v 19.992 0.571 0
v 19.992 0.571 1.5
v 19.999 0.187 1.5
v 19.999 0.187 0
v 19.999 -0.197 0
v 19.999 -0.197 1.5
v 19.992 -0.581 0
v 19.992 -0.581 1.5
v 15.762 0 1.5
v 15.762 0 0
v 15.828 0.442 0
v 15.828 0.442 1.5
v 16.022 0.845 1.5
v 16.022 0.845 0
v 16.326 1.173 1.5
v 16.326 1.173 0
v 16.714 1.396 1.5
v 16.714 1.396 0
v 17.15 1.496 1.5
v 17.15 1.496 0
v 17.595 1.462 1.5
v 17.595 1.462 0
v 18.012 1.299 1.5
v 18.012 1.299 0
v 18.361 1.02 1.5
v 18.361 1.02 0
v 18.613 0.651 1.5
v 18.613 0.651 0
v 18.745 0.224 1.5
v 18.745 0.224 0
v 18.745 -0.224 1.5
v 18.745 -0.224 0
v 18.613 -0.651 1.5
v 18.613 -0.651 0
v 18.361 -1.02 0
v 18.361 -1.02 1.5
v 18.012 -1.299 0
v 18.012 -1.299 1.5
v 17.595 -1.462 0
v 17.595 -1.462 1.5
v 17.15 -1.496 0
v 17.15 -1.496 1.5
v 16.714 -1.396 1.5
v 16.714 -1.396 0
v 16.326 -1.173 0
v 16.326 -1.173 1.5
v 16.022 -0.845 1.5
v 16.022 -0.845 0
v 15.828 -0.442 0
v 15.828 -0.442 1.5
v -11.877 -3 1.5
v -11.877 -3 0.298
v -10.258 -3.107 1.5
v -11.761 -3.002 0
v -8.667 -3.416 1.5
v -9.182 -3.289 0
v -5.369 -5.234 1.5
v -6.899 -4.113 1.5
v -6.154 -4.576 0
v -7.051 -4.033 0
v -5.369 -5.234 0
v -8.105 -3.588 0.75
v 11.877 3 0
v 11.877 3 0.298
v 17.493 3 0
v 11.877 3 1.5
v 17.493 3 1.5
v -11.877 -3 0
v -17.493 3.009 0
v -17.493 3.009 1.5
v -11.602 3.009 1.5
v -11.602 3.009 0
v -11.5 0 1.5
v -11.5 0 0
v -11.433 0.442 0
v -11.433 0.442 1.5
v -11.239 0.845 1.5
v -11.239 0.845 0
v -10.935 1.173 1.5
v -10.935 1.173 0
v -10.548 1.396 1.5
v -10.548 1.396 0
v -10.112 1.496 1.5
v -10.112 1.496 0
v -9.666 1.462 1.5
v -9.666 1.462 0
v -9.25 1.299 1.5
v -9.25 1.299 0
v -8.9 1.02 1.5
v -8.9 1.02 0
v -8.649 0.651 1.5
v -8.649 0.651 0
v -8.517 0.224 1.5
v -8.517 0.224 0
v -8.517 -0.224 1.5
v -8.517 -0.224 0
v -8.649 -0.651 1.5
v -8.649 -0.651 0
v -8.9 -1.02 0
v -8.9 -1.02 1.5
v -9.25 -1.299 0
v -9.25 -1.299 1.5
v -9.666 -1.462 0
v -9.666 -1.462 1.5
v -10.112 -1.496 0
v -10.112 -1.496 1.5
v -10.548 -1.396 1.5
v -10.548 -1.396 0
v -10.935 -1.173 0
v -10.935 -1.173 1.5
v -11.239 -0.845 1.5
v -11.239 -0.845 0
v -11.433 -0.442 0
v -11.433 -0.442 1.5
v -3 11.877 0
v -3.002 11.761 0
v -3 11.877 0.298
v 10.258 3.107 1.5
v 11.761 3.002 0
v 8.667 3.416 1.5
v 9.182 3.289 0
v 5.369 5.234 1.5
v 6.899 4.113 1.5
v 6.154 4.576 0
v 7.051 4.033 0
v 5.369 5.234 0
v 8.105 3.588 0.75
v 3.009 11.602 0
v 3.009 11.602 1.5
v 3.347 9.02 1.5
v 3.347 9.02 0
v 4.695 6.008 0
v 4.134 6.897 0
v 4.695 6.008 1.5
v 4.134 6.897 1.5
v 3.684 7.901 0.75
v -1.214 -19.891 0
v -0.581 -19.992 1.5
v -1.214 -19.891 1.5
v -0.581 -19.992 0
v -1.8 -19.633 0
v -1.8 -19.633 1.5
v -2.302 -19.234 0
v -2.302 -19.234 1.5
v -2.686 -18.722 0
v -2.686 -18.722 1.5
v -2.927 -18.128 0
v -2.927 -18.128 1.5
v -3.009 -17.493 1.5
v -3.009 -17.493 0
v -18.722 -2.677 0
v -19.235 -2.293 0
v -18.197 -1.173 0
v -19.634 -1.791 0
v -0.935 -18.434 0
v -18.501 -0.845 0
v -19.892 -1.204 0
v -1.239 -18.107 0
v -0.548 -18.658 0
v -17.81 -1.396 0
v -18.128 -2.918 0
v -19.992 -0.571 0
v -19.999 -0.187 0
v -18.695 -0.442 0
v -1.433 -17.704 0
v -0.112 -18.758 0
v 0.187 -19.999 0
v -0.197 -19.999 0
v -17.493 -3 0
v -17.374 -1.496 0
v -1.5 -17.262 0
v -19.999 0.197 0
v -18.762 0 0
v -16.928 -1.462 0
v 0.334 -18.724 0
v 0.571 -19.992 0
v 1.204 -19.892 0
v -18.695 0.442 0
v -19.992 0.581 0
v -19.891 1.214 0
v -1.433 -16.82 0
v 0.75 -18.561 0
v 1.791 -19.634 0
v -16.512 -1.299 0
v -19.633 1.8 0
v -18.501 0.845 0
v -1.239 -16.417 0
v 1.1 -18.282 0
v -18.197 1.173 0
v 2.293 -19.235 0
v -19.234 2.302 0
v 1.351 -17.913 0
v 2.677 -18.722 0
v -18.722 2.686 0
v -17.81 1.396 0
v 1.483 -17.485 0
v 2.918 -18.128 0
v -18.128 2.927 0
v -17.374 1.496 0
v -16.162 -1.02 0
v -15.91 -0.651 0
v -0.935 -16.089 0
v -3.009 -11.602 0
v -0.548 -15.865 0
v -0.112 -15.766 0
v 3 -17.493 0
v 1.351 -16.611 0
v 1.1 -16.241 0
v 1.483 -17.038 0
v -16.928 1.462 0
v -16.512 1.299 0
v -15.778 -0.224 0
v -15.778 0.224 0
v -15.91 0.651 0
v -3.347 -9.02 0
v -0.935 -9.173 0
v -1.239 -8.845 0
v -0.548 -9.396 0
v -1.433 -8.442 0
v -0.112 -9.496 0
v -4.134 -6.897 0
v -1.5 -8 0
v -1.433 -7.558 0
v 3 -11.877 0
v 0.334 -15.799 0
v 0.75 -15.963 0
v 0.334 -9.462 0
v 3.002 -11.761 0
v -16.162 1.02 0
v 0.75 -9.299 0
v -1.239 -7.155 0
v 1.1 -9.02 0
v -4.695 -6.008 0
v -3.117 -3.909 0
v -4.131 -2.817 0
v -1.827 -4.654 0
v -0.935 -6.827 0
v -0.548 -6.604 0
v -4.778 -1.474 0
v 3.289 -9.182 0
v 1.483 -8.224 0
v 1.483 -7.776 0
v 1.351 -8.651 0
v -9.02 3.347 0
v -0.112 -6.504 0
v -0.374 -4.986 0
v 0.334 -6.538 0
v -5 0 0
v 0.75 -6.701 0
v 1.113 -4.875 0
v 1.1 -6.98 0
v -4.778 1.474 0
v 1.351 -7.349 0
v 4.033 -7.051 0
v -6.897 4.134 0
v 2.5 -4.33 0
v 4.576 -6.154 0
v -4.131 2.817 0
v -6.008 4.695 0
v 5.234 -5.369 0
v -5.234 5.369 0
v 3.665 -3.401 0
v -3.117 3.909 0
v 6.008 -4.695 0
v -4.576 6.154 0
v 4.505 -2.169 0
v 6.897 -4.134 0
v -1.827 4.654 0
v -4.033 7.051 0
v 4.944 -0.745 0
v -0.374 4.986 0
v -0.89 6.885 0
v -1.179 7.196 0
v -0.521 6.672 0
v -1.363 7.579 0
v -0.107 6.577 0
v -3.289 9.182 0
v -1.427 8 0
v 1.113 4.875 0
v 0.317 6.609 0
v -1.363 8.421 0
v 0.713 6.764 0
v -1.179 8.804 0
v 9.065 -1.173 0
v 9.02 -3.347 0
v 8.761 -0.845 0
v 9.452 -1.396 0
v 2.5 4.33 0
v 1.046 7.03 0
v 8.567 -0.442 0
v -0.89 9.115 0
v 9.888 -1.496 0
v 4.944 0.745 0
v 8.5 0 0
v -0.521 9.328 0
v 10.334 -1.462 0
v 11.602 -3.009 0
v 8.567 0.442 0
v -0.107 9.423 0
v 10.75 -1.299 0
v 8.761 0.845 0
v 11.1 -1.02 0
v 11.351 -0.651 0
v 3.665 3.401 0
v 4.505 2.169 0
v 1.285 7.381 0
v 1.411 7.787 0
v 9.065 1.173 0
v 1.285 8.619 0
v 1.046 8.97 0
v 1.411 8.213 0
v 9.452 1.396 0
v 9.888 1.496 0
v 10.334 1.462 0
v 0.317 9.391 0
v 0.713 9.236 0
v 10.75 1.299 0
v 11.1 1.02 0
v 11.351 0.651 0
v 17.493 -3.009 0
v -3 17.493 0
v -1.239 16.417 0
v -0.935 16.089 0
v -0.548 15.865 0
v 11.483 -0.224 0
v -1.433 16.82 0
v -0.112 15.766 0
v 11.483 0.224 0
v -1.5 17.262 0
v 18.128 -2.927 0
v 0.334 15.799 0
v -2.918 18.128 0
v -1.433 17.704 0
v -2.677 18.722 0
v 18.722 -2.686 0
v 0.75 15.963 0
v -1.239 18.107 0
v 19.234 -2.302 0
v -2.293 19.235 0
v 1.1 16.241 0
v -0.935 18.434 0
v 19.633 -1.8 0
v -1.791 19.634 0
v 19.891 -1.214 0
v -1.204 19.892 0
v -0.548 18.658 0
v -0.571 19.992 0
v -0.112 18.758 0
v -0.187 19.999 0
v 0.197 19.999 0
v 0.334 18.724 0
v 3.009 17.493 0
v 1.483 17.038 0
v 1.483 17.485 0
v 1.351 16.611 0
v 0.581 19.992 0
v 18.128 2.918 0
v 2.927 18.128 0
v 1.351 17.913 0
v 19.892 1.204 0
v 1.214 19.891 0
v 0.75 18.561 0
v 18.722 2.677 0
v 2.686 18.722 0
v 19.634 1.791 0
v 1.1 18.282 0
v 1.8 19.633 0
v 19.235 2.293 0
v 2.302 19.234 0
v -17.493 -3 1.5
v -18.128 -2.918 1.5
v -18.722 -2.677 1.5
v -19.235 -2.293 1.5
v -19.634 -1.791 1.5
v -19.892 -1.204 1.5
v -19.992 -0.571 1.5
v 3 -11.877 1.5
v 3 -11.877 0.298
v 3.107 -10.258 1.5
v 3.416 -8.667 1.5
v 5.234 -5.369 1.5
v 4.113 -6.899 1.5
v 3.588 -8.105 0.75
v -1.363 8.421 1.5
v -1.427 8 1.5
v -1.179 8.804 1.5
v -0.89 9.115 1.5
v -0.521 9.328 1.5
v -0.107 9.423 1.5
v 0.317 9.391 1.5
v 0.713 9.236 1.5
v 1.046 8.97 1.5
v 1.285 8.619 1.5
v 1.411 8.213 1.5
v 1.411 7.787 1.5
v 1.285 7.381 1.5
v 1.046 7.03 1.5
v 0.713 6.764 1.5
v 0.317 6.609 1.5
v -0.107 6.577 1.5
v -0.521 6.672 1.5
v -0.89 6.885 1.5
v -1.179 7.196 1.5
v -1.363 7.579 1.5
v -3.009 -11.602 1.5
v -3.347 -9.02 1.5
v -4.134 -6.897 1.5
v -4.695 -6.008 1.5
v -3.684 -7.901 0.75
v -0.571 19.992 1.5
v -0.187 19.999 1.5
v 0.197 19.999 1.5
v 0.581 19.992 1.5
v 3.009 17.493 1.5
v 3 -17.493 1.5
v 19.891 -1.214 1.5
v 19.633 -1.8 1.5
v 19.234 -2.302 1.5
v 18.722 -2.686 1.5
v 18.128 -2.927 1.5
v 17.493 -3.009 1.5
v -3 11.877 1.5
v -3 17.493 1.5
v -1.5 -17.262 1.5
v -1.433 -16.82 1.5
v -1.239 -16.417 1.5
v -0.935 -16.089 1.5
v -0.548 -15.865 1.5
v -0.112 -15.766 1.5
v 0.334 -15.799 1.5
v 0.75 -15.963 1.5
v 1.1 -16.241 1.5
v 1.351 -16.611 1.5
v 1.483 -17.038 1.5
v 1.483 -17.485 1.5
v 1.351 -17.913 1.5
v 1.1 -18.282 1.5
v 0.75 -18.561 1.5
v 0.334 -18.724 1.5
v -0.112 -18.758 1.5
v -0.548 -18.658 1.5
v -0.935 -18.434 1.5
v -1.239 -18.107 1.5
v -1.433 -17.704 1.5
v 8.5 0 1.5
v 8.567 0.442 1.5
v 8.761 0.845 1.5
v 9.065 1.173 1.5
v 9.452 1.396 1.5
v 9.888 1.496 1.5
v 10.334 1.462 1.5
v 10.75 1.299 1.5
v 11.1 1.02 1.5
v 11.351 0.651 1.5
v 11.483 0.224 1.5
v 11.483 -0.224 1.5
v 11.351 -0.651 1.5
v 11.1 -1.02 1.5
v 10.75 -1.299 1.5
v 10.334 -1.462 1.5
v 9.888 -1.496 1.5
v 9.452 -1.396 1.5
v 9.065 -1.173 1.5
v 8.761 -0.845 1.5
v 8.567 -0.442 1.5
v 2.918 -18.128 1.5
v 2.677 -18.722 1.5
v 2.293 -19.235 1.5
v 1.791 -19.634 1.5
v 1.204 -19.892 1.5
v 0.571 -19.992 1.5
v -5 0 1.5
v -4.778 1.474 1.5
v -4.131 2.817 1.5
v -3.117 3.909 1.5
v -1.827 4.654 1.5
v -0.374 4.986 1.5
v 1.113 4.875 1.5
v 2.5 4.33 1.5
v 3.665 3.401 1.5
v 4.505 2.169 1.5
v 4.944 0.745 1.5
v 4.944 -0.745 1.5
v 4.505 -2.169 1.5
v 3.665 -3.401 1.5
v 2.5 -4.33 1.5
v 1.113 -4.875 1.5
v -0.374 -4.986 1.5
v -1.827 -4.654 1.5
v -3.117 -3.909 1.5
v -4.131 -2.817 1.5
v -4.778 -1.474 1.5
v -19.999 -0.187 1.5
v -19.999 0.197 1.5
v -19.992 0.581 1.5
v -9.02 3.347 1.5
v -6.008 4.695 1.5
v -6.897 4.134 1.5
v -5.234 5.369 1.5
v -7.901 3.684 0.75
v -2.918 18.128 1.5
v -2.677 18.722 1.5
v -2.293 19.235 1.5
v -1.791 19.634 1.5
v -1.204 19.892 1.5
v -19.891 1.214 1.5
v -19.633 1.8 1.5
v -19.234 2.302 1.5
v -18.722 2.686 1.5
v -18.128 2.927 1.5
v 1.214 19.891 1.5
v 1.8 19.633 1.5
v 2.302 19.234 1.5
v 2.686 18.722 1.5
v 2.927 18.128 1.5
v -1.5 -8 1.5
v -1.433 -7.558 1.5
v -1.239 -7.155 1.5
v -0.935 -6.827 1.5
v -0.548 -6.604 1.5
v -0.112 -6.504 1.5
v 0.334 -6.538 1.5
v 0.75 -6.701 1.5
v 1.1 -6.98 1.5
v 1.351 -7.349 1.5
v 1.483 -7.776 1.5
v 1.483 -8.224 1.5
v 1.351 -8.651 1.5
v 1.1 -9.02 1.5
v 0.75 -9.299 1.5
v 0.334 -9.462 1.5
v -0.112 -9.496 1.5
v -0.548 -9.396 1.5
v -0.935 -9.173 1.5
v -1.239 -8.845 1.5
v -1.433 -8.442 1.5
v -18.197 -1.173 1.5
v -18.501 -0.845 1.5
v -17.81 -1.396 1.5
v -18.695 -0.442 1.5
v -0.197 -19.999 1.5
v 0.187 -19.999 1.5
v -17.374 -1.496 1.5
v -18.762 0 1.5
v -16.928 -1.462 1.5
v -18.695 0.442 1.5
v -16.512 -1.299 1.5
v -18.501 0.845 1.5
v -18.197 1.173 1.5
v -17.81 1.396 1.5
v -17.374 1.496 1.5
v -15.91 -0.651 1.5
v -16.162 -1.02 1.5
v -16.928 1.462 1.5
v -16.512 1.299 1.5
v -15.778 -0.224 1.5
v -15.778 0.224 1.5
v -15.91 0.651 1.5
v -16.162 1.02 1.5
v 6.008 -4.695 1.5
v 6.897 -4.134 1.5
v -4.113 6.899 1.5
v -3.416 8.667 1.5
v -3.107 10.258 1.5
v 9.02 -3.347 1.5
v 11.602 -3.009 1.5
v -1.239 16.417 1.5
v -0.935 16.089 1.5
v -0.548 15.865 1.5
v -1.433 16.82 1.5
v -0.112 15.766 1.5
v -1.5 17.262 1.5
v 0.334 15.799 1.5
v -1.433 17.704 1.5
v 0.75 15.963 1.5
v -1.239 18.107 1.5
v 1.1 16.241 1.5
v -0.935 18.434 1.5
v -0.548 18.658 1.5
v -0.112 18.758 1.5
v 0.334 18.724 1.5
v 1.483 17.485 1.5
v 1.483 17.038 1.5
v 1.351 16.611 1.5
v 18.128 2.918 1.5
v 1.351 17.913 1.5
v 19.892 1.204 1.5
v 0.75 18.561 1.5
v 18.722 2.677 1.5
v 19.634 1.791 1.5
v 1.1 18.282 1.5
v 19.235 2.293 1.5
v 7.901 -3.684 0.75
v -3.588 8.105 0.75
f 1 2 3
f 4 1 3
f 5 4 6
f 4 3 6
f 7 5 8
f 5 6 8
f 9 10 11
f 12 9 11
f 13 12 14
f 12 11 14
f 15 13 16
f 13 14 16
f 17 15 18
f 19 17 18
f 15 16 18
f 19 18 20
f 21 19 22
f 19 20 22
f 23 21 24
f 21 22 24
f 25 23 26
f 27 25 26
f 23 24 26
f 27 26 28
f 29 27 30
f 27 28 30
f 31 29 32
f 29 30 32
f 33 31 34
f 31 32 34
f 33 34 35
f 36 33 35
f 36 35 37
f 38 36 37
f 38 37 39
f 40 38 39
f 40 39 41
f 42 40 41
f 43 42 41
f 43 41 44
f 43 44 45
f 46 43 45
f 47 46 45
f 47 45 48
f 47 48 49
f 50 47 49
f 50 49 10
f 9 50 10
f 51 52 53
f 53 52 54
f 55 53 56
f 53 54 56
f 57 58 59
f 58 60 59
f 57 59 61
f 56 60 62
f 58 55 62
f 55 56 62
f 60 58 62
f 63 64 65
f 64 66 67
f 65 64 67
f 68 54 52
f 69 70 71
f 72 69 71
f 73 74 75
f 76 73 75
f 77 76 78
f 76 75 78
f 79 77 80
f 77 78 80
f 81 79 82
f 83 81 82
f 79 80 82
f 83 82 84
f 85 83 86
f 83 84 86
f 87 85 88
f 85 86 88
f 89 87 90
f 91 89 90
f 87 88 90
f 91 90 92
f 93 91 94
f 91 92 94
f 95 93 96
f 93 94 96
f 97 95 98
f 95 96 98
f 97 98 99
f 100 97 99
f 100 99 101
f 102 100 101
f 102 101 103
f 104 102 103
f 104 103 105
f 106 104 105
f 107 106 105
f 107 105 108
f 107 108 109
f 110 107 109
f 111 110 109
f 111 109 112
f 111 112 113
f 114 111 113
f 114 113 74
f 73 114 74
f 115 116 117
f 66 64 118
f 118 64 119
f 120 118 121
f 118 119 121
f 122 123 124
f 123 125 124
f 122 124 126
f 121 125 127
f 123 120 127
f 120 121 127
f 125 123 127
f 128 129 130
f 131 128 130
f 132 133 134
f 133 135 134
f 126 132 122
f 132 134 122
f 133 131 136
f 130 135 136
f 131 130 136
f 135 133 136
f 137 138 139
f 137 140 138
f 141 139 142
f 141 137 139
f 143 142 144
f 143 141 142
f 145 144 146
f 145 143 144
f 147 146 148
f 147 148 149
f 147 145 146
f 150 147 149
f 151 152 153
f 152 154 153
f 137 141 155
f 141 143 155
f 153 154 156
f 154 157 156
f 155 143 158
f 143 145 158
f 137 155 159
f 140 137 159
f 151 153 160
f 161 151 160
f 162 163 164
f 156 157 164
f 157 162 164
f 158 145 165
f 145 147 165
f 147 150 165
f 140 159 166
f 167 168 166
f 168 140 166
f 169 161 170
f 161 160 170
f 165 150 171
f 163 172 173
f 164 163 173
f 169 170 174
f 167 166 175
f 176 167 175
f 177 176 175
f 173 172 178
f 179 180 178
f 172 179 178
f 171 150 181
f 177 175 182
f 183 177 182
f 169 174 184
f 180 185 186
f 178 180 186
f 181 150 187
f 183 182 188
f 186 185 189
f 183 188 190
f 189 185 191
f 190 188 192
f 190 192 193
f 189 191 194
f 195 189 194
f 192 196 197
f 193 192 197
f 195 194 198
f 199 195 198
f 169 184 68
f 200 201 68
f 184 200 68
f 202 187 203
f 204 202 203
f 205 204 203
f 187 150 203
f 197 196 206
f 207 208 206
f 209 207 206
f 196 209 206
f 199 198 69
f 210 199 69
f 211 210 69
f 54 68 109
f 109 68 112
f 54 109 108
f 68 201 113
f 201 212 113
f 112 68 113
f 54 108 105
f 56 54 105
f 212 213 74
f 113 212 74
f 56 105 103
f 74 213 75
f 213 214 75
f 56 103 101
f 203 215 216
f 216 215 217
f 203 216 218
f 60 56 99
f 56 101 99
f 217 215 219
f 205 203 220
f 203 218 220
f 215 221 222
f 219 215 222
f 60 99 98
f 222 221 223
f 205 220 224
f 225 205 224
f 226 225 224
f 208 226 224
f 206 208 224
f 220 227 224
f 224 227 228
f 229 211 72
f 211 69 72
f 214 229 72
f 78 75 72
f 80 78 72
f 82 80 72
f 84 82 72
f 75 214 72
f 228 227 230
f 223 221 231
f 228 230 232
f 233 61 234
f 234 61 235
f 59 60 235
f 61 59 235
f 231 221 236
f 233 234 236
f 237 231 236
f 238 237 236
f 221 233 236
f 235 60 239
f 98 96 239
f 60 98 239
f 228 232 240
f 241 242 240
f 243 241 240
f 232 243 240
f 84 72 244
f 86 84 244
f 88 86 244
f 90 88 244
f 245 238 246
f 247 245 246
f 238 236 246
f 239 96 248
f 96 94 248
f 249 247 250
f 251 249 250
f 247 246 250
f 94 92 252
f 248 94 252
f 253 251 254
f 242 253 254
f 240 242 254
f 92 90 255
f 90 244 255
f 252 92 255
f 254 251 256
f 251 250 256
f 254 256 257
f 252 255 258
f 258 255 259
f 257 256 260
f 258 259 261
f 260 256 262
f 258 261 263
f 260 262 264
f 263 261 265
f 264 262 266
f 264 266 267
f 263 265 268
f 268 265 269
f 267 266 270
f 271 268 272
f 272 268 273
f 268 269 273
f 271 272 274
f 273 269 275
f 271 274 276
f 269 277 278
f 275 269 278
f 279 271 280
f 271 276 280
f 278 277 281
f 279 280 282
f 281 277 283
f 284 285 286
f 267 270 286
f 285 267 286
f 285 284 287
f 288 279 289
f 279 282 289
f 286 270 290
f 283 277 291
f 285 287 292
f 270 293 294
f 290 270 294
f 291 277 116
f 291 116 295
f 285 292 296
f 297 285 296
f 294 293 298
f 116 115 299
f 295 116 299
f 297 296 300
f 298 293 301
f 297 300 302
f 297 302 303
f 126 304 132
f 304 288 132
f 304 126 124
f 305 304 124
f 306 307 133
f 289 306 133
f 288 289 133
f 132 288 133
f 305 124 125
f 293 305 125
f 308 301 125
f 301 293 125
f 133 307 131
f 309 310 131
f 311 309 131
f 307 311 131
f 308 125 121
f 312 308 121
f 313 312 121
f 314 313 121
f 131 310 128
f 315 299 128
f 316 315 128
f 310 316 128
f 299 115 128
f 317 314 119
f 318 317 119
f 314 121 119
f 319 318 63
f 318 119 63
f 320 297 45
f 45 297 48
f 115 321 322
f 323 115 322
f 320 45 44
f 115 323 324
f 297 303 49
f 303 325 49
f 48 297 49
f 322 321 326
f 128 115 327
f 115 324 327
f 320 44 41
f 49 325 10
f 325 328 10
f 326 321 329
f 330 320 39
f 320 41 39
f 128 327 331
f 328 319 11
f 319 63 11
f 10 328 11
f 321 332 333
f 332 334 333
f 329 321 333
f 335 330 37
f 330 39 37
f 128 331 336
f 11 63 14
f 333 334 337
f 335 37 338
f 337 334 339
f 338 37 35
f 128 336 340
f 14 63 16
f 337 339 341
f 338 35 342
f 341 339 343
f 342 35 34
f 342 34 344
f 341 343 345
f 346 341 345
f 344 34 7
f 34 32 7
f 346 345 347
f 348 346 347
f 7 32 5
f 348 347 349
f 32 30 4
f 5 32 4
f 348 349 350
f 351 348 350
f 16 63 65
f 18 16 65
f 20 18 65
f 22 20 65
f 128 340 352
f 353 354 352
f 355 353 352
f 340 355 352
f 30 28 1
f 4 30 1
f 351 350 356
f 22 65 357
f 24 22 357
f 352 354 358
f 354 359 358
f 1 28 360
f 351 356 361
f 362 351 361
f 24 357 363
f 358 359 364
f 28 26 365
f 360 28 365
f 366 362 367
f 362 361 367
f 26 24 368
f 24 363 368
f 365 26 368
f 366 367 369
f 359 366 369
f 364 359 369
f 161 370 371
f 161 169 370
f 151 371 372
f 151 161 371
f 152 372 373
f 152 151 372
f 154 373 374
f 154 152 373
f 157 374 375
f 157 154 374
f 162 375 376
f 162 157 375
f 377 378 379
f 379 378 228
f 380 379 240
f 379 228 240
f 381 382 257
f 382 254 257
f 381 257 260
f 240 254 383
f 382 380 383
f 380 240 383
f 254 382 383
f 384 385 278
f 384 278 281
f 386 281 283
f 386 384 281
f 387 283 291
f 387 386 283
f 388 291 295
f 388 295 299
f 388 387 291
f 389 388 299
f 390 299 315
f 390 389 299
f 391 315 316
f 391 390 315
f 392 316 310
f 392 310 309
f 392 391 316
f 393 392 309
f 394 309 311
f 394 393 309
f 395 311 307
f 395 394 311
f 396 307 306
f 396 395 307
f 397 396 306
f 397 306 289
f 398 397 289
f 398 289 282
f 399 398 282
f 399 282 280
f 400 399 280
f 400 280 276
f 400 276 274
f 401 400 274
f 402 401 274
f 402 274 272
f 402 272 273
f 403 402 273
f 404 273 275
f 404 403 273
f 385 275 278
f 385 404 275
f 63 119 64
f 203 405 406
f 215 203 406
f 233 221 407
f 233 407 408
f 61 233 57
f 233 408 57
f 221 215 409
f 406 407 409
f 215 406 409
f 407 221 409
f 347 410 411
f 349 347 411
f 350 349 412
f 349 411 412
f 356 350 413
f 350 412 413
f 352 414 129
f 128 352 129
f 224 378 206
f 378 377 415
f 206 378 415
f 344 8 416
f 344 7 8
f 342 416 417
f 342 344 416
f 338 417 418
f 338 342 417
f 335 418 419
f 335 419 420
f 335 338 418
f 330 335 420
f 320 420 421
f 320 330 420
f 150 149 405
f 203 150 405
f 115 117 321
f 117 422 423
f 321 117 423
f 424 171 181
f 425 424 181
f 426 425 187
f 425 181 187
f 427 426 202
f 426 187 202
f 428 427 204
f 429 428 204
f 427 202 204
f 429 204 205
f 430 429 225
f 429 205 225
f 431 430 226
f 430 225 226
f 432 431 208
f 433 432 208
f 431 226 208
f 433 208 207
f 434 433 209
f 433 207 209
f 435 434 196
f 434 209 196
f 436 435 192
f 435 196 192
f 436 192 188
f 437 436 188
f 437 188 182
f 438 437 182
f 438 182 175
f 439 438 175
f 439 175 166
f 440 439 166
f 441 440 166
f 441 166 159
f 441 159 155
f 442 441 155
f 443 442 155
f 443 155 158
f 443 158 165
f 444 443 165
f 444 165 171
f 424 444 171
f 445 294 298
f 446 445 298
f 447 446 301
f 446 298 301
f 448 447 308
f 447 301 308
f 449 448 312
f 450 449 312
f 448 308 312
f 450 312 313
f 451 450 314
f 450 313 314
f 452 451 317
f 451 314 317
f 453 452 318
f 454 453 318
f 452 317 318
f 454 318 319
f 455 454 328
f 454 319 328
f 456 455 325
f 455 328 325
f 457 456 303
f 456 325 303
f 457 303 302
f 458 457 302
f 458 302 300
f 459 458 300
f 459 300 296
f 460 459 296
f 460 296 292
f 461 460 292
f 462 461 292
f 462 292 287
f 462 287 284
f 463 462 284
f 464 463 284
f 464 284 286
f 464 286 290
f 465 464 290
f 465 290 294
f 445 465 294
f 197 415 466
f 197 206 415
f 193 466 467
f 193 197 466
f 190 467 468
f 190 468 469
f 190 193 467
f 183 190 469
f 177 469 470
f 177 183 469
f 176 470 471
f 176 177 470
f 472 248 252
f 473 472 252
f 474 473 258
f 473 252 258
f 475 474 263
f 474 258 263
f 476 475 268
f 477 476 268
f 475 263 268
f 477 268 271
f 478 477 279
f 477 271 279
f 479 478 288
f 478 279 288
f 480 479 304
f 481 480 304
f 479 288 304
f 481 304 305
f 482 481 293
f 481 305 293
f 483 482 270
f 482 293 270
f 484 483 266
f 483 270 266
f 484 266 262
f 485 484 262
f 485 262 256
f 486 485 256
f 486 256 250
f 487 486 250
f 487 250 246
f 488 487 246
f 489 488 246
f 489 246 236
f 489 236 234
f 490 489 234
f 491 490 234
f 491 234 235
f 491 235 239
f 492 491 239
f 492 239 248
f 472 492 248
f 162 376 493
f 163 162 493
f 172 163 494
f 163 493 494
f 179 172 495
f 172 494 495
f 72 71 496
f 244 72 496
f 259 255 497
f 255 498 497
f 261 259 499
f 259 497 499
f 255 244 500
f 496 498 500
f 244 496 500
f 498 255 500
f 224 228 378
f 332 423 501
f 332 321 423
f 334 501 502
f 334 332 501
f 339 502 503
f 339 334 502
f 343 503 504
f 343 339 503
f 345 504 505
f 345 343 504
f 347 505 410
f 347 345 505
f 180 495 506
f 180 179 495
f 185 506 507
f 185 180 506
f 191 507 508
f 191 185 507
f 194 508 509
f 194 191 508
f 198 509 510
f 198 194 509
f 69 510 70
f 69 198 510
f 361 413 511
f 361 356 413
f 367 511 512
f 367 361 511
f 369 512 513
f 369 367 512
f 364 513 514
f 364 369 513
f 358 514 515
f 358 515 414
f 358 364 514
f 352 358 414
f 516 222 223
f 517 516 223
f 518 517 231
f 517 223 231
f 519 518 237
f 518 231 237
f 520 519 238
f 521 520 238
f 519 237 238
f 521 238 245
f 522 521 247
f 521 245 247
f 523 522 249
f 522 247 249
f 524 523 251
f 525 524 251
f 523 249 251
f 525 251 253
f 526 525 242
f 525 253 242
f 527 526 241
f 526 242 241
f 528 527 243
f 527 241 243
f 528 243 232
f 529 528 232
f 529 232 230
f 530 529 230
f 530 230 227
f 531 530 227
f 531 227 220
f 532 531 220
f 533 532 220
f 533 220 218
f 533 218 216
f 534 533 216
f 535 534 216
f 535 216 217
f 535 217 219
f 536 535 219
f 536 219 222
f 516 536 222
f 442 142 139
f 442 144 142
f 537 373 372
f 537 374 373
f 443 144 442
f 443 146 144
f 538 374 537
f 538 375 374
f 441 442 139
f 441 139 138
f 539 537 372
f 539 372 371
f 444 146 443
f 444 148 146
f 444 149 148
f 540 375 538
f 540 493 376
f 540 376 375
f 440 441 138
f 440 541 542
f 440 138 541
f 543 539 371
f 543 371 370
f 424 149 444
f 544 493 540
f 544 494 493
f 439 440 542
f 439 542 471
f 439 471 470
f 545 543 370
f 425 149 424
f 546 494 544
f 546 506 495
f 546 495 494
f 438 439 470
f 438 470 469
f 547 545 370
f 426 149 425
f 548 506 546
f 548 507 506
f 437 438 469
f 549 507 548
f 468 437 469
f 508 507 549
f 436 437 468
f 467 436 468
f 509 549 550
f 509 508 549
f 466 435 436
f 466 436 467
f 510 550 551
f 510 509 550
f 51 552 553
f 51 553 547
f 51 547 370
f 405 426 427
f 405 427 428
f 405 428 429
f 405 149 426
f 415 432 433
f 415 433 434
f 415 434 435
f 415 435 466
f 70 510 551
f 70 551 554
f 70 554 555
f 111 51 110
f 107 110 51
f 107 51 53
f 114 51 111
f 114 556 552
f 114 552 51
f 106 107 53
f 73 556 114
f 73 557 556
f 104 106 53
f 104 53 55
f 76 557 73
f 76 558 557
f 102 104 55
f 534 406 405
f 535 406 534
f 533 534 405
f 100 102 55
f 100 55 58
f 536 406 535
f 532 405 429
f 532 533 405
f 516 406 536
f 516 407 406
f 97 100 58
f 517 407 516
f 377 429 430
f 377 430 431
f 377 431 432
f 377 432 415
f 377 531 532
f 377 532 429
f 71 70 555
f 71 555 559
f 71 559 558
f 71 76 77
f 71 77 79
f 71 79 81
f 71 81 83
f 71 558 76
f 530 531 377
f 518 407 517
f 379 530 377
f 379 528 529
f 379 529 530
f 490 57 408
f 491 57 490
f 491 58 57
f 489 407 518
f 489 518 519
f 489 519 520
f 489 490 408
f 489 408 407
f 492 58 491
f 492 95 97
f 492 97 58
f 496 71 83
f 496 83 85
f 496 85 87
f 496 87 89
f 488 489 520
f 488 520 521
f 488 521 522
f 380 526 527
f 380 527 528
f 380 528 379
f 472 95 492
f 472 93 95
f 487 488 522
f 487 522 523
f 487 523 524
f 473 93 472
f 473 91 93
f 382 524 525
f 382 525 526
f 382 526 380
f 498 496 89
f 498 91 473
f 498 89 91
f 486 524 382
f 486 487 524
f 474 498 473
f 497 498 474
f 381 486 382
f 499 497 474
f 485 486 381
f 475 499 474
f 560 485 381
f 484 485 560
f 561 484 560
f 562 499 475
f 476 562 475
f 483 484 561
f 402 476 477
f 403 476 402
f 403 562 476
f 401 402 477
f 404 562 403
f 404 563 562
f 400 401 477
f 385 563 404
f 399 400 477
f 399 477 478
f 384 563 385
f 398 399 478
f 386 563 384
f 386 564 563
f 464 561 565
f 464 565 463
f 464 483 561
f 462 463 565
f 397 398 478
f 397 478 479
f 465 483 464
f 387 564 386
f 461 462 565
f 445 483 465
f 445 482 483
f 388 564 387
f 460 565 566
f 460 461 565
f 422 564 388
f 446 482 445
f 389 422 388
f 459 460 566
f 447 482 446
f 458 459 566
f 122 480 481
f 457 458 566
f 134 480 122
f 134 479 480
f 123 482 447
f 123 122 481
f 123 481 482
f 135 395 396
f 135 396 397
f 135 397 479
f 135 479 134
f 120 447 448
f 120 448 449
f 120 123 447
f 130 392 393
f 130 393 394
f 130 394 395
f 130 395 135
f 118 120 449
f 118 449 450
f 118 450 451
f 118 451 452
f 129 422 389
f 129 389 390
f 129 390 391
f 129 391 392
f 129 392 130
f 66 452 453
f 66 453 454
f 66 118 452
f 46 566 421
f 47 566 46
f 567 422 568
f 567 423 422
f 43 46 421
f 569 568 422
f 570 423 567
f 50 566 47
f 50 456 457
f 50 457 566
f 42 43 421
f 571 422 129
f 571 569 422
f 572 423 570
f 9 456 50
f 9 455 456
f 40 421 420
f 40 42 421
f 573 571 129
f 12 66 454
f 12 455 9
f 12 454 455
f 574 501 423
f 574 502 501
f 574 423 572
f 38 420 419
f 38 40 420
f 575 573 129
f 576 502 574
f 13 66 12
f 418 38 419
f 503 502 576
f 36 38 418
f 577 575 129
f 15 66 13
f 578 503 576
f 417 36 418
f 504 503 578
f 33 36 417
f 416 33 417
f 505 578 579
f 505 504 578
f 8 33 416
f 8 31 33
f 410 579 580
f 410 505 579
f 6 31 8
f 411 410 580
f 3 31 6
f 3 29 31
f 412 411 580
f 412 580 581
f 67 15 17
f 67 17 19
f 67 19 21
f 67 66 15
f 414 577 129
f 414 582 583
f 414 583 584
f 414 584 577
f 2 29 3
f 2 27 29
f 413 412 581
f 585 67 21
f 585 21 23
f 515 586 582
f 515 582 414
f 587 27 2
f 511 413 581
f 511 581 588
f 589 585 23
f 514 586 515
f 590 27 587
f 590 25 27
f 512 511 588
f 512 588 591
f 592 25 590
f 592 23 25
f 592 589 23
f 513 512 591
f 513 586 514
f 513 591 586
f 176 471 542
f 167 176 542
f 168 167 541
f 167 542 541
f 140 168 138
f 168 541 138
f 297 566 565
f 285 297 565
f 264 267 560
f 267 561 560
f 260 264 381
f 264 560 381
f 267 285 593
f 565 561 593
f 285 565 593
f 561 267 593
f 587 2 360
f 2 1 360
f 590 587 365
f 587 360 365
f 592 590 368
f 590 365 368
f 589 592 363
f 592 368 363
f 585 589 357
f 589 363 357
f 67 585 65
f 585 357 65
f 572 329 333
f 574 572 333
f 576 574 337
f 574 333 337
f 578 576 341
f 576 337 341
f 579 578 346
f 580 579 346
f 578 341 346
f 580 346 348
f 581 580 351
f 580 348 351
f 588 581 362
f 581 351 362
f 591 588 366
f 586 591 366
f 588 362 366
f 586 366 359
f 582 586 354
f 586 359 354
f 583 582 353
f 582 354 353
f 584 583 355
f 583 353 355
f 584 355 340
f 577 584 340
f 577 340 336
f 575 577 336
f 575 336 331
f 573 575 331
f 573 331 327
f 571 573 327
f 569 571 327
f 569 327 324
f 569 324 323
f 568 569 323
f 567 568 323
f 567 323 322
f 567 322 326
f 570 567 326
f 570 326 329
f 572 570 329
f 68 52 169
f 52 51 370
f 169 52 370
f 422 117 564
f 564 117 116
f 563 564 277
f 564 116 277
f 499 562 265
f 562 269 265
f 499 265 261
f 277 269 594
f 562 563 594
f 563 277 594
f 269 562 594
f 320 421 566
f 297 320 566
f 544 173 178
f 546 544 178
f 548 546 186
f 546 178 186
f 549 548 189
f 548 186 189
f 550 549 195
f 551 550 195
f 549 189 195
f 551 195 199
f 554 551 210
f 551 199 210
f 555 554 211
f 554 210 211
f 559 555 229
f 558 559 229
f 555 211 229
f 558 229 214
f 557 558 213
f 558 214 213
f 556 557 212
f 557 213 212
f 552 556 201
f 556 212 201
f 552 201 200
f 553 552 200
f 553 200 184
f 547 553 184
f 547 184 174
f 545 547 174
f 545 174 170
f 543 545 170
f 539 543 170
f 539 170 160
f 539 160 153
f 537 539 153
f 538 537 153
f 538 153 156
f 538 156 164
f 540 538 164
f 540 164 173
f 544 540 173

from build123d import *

# Parameters (mm, degrees)
SKETCH1_R                 = 14
BOSS_EXTRUDE1_DEPTH       = 18.5
CUT_EXTRUDE1_START        = -13.5
SKETCH2_R                 = 14
SKETCH2_R_2               = 5
CUT_EXTRUDE1_DEPTH        = 13.5
SKETCH3_R                 = 4
CUT_EXTRUDE2_DEPTH        = 22.5
CUT_EXTRUDE3_DEPTH        = 3.75
SKETCH8_R                 = 12.271364757
SKETCH8_R_2               = 6.141449245
CUT_EXTRUDE4_DEPTH        = 2.75
CIRPATTERN1_COUNT         = 4
SKETCH11_R                = 1.5
CUT_EXTRUDE5_DEPTH        = 3
SKETCH12_R                = 21.13637798
CUT_EXTRUDE6_DEPTH        = 17
BOSS_EXTRUDE2_START       = -1.5
BOSS_EXTRUDE2_OUTLINE_R   = 1.5
BOSS_EXTRUDE2_OUTLINE_R_2 = 1.517060808
BOSS_EXTRUDE2_OUTLINE_R_3 = 4
BOSS_EXTRUDE2_OUTLINE_R_4 = 1.426709917
BOSS_EXTRUDE2_DEPTH       = 1.5
FILLET1_R                 = 2.5
SKETCH14_R                = 1.5
SKETCH14_R_2              = 5
CUT_EXTRUDE7_DEPTH        = 14.5


# Read off the part's stored shape, not the designer's step: Boss-Extrude2
with BuildPart() as part:
    # Sketch1 → Boss-Extrude1 (new body)
    with BuildSketch(Plane.XY):
        Circle(SKETCH1_R)
    extrude(amount=BOSS_EXTRUDE1_DEPTH)

    # Sketch2 → Cut-Extrude1 (cut)
    with BuildSketch(Plane.XY.offset(18.5).offset(CUT_EXTRUDE1_START)):
        Circle(SKETCH2_R)
        Circle(SKETCH2_R_2, mode=Mode.SUBTRACT)
    extrude(amount=CUT_EXTRUDE1_DEPTH, mode=Mode.SUBTRACT)

    # Sketch3 → Cut-Extrude2 (cut)
    with BuildSketch(Plane.XY.offset(18.5)):
        Circle(SKETCH3_R)
    extrude(amount=-CUT_EXTRUDE2_DEPTH, mode=Mode.SUBTRACT)

    # Sketch6 → Cut-Revolve1 (revolve, cut)
    with BuildSketch(Plane(origin=(0, 0, 0), x_dir=(0, 0, -1), z_dir=(1, 0, 0)), mode=Mode.PRIVATE) as cut_revolve1_sk:
        Polygon((-4.949121361, 14), (3.777639186, 16.199586118), (5.061522468, 10.233304984), align=None)
    revolve(cut_revolve1_sk.sketch.rotate(Axis((0, 0, 19.921792725), (0, 0, -1)), 90), axis=Axis((0, 0, 19.921792725), (0, 0, -1)), mode=Mode.SUBTRACT)

    # Sketch7 → Cut-Extrude3 (cut)
    with BuildSketch(Plane(origin=(0, 0, 0), x_dir=(-1, 0, 0), z_dir=(0, 0, -1))):
        with BuildLine():
            Line((3, 15.639460569), (3, 11.87697352))
            add(Edge.make_bspline(
                [(3, 11.87697352), (3.121054504, 3.206614769), (11.87697352, 3)],
                knots=[0, 0, 0, 1, 1, 1], degree=2))
            Line((11.87697352, 3), (17.86108213, 3))
            Line((17.86108213, 3), (14.869027825, 14.316513241))
            Line((14.869027825, 14.316513241), (3, 15.639460569))
        make_face()
    cut_extrude3 = extrude(amount=-CUT_EXTRUDE3_DEPTH, mode=Mode.SUBTRACT)

    # Sketch8 → Cut-Extrude4 (cut)
    with BuildSketch(Plane.XY.offset(5)):
        Circle(SKETCH8_R)
        Circle(SKETCH8_R_2, mode=Mode.SUBTRACT)
    extrude(amount=-CUT_EXTRUDE4_DEPTH, mode=Mode.SUBTRACT)

    # Sketch9 → Cut-Revolve2 (revolve, cut)
    with BuildSketch(Plane(origin=(0, 0, 0), x_dir=(1, 0, 0), z_dir=(0, 1, 0)), mode=Mode.PRIVATE) as cut_revolve2_sk:
        Polygon((-12.001476603, -2.22152714), (-13.001507243, -5.36905248), (-11.155114973, -5.36905248), align=None)
    revolve(cut_revolve2_sk.sketch.rotate(Axis((0, 0, -1.742471472), (0, 0, 1)), 180), axis=Axis((0, 0, -1.742471472), (0, 0, 1)), mode=Mode.SUBTRACT)

    # Sketch10 → Cut-Revolve3 (revolve, cut)
    with BuildSketch(Plane(origin=(0, 0, 0), x_dir=(1, 0, 0), z_dir=(0, 1, 0)), mode=Mode.PRIVATE) as cut_revolve3_sk:
        Polygon((-5, -5), (-6.141449245, -2.28305418), (-6.572257958, -5.413209842), align=None)
    revolve(cut_revolve3_sk.sketch.rotate(Axis((0, 0, 0), (0, 0, -1)), 180), axis=Axis((0, 0, 0), (0, 0, -1)), mode=Mode.SUBTRACT)

    # CirPattern1: Cut-Extrude3 ×4 about axis
    cirpattern1_axis = Axis((0, 0, 3.75), (0, 0, 1))
    for i in range(1, CIRPATTERN1_COUNT):
        add(cut_extrude3.rotate(cirpattern1_axis, i * 360 / CIRPATTERN1_COUNT), mode=Mode.SUBTRACT)

    # Sketch11 → Cut-Extrude5 (cut)
    with BuildSketch(Plane(origin=(0, 0, 0), x_dir=(-1, 0, 0), z_dir=(0, 0, -1))):
        with Locations((0, 8)):
            Circle(SKETCH11_R)
        with Locations((0, -8)):
            Circle(SKETCH11_R)
        with Locations((-10, 0)):
            Circle(SKETCH11_R)
        with Locations((10, 0)):
            Circle(SKETCH11_R)
    extrude(amount=-CUT_EXTRUDE5_DEPTH, mode=Mode.SUBTRACT)

    # Sketch12 → Cut-Extrude6 (cut)
    with BuildSketch(Plane.XY.offset(18.5)):
        Circle(SKETCH12_R)
    extrude(amount=-CUT_EXTRUDE6_DEPTH, mode=Mode.SUBTRACT)

    # Boss-Extrude2 outline → Boss-Extrude2 (add)
    # profile 1 of 7: a face of its own
    with BuildSketch(Plane(origin=(0, 0, 0), x_dir=(-1, 0, 0), z_dir=(0, 0, -1)).offset(BOSS_EXTRUDE2_START)):
        with BuildLine():
            add(Edge.make_bspline(
                [(3.00190242, 11.760729011), (3.000755095, 11.818659857), (3, 11.87697352)],
                knots=[0.993159083, 0.993159083, 0.993159083, 1, 1, 1], degree=2))
            Line((3, 11.87697352), (3, 19.773719933))
            ThreePointArc((3, 19.773719933), (-0.004378174, 19.999999521), (-3.00865699, 19.772404586))
            Line((-3.00865699, 19.772404586), (-3.008656992, 11.602060374))
            add(Edge.make_bspline(
                [(-5.368896851, 5.233886038), (-3.175302873, 7.384008673), (-3.008656992, 11.602060374)],
                knots=[0.4948048, 0.4948048, 0.4948048, 0.984177857, 0.984177857, 0.984177857], degree=2))
            add(Edge.make_bspline(
                [(-5.368896851, 5.233886038), (-7.55686142, 3.085160323), (-11.760729011, 3.00190242)],
                knots=[0.496734279, 0.496734279, 0.496734279, 0.993159083, 0.993159083, 0.993159083], degree=2))
            add(Edge.make_bspline(
                [(-11.760729011, 3.00190242), (-11.818659857, 3.000755095), (-11.87697352, 3)],
                knots=[0.993159083, 0.993159083, 0.993159083, 1, 1, 1], degree=2))
            Line((-11.87697352, 3), (-19.773719933, 3))
            ThreePointArc((-19.773719933, 3), (-19.999999521, -0.004378174), (-19.772404586, -3.00865699))
            Line((-19.772404586, -3.00865699), (-11.602060374, -3.008656992))
            add(Edge.make_bspline(
                [(-5.233886038, -5.368896851), (-7.384008673, -3.175302873), (-11.602060374, -3.008656992)],
                knots=[0.4948048, 0.4948048, 0.4948048, 0.984177857, 0.984177857, 0.984177857], degree=2))
            add(Edge.make_bspline(
                [(-5.233886038, -5.368896851), (-3.085160323, -7.55686142), (-3.00190242, -11.760729011)],
                knots=[0.496734279, 0.496734279, 0.496734279, 0.993159083, 0.993159083, 0.993159083], degree=2))
            add(Edge.make_bspline(
                [(-3.00190242, -11.760729011), (-3.000755095, -11.818659857), (-3, -11.87697352)],
                knots=[0.993159083, 0.993159083, 0.993159083, 1, 1, 1], degree=2))
            Line((-3, -11.87697352), (-3, -19.773719933))
            ThreePointArc((-3, -19.773719933), (0.004378174, -19.999999521), (3.00865699, -19.772404586))
            Line((3.00865699, -19.772404586), (3.008656992, -11.602060374))
            add(Edge.make_bspline(
                [(5.368896851, -5.233886038), (3.175302873, -7.384008673), (3.008656992, -11.602060374)],
                knots=[0.4948048, 0.4948048, 0.4948048, 0.984177857, 0.984177857, 0.984177857], degree=2))
            add(Edge.make_bspline(
                [(5.368896851, -5.233886038), (7.55686142, -3.085160323), (11.760729011, -3.00190242)],
                knots=[0.496734279, 0.496734279, 0.496734279, 0.993159083, 0.993159083, 0.993159083], degree=2))
            add(Edge.make_bspline(
                [(11.760729011, -3.00190242), (11.818659857, -3.000755095), (11.87697352, -3)],
                knots=[0.993159083, 0.993159083, 0.993159083, 1, 1, 1], degree=2))
            Line((11.87697352, -3), (19.773719933, -3))
            ThreePointArc((19.773719933, -3), (19.999999521, 0.004378174), (19.772404586, 3.00865699))
            Line((19.772404586, 3.00865699), (11.602060374, 3.008656992))
            add(Edge.make_bspline(
                [(5.233886023, 5.368896867), (7.384008658, 3.175302874), (11.602060374, 3.008656992)],
                knots=[0.494804799, 0.494804799, 0.494804799, 0.984177857, 0.984177857, 0.984177857], degree=2))
            add(Edge.make_bspline(
                [(5.233886023, 5.368896867), (3.085160322, 7.556861435), (3.00190242, 11.760729011)],
                knots=[0.496734281, 0.496734281, 0.496734281, 0.993159083, 0.993159083, 0.993159083], degree=2))
        make_face()
        with Locations((0, -8)):
            Circle(BOSS_EXTRUDE2_OUTLINE_R, mode=Mode.SUBTRACT)
        with Locations((-10, 0)):
            Circle(BOSS_EXTRUDE2_OUTLINE_R_2, mode=Mode.SUBTRACT)
        Circle(BOSS_EXTRUDE2_OUTLINE_R_3, mode=Mode.SUBTRACT)
        with Locations((0, 8)):
            Circle(BOSS_EXTRUDE2_OUTLINE_R, mode=Mode.SUBTRACT)
        with Locations((10, 0)):
            Circle(BOSS_EXTRUDE2_OUTLINE_R, mode=Mode.SUBTRACT)
    # profile 2 of 7: a face of its own
    with BuildSketch(Plane(origin=(0, 0, 0), x_dir=(-1, 0, 0), z_dir=(0, 0, -1)).offset(BOSS_EXTRUDE2_START)):
        with BuildLine():
            add(Edge.make_bspline(
                [(11.60206042, 3.00865699), (7.383951275, 3.179568286), (5.233886023, 5.368896867)],
                knots=[0, 0, 0, 0.496734281, 0.496734281, 0.496734281], degree=2))
            add(Edge.make_bspline(
                [(5.233886023, 5.368896867), (7.384008658, 3.175302874), (11.60206042, 3.00865699)],
                knots=[0.494804799, 0.494804799, 0.494804799, 0.984177857, 0.984177857, 0.984177857], degree=2))
        make_face()
    # profile 3 of 7: a face of its own
    with BuildSketch(Plane(origin=(0, 0, 0), x_dir=(-1, 0, 0), z_dir=(0, 0, -1)).offset(BOSS_EXTRUDE2_START)):
        with BuildLine():
            add(Edge.make_bspline(
                [(-5.368896851, 5.233886038), (-3.175302873, 7.384008673), (-3.008656992, 11.602060374)],
                knots=[0.4948048, 0.4948048, 0.4948048, 0.984177857, 0.984177857, 0.984177857], degree=2))
            add(Edge.make_bspline(
                [(-3.008656992, 11.602060374), (-3.179568285, 7.383951289), (-5.368896851, 5.233886038)],
                knots=[0, 0, 0, 0.496734279, 0.496734279, 0.496734279], degree=2))
        make_face()
    # profile 4 of 7: a face of its own
    with BuildSketch(Plane(origin=(0, 0, 0), x_dir=(-1, 0, 0), z_dir=(0, 0, -1)).offset(BOSS_EXTRUDE2_START)):
        with BuildLine():
            add(Edge.make_bspline(
                [(3.00865699, -11.60206042), (3.179568285, -7.383951289), (5.368896851, -5.233886038)],
                knots=[0, 0, 0, 0.496734279, 0.496734279, 0.496734279], degree=2))
            add(Edge.make_bspline(
                [(5.368896851, -5.233886038), (3.175302873, -7.384008673), (3.00865699, -11.60206042)],
                knots=[0.4948048, 0.4948048, 0.4948048, 0.984177857, 0.984177857, 0.984177857], degree=2))
        make_face()
    # profile 5 of 7: a face of its own
    with BuildSketch(Plane(origin=(0, 0, 0), x_dir=(-1, 0, 0), z_dir=(0, 0, -1)).offset(BOSS_EXTRUDE2_START)):
        with BuildLine():
            add(Edge.make_bspline(
                [(-5.233886038, -5.368896851), (-7.384008673, -3.175302873), (-11.602060374, -3.008656992)],
                knots=[0.4948048, 0.4948048, 0.4948048, 0.984177857, 0.984177857, 0.984177857], degree=2))
            add(Edge.make_bspline(
                [(-11.602060374, -3.008656992), (-7.383951289, -3.179568285), (-5.233886038, -5.368896851)],
                knots=[0, 0, 0, 0.496734279, 0.496734279, 0.496734279], degree=2))
        make_face()
    # profile 6 of 7: a face of its own
    with BuildSketch(Plane(origin=(0, 0, 0), x_dir=(-1, 0, 0), z_dir=(0, 0, -1)).offset(BOSS_EXTRUDE2_START)):
        Circle(BOSS_EXTRUDE2_OUTLINE_R_3)
    # profile 7 of 7: a face of its own
    with BuildSketch(Plane(origin=(0, 0, 0), x_dir=(-1, 0, 0), z_dir=(0, 0, -1)).offset(BOSS_EXTRUDE2_START)):
        with Locations((0, 8)):
            Circle(BOSS_EXTRUDE2_OUTLINE_R)
        with Locations((0, 8)):
            Circle(BOSS_EXTRUDE2_OUTLINE_R_4, mode=Mode.SUBTRACT)
    extrude(amount=BOSS_EXTRUDE2_DEPTH)

    # Fillet1
    fillet1_edges = [part.edges().sort_by_distance(p)[0] for p in [
        (-19.772404586, 3.00865699, 0.75),
        (-19.773719933, -3, 0.75),
        (-3.00865699, -19.772404586, 0.75),
        (3, -19.773719933, 0.75),
        (19.772404586, -3.00865699, 0.75),
        (19.773719933, 3, 0.75),
        (-3, 19.773719933, 0.75),
        (3.00865699, 19.772404586, 0.75),
    ]]
    fillet(fillet1_edges, radius=FILLET1_R)

    # Sketch14 → Cut-Extrude7 (cut)
    with BuildSketch(Plane(origin=(0, 0, 0), x_dir=(-1, 0, 0), z_dir=(0, 0, -1))):
        with Locations((0, 17.261717903)):
            Circle(SKETCH14_R)
        with Locations((17.261717903, 0)):
            Circle(SKETCH14_R)
        with Locations((0, -17.261717903)):
            Circle(SKETCH14_R)
        with Locations((-17.261717903, 0)):
            Circle(SKETCH14_R)
        Circle(SKETCH14_R_2)
    extrude(amount=-CUT_EXTRUDE7_DEPTH, mode=Mode.SUBTRACT)


solid = part.part
